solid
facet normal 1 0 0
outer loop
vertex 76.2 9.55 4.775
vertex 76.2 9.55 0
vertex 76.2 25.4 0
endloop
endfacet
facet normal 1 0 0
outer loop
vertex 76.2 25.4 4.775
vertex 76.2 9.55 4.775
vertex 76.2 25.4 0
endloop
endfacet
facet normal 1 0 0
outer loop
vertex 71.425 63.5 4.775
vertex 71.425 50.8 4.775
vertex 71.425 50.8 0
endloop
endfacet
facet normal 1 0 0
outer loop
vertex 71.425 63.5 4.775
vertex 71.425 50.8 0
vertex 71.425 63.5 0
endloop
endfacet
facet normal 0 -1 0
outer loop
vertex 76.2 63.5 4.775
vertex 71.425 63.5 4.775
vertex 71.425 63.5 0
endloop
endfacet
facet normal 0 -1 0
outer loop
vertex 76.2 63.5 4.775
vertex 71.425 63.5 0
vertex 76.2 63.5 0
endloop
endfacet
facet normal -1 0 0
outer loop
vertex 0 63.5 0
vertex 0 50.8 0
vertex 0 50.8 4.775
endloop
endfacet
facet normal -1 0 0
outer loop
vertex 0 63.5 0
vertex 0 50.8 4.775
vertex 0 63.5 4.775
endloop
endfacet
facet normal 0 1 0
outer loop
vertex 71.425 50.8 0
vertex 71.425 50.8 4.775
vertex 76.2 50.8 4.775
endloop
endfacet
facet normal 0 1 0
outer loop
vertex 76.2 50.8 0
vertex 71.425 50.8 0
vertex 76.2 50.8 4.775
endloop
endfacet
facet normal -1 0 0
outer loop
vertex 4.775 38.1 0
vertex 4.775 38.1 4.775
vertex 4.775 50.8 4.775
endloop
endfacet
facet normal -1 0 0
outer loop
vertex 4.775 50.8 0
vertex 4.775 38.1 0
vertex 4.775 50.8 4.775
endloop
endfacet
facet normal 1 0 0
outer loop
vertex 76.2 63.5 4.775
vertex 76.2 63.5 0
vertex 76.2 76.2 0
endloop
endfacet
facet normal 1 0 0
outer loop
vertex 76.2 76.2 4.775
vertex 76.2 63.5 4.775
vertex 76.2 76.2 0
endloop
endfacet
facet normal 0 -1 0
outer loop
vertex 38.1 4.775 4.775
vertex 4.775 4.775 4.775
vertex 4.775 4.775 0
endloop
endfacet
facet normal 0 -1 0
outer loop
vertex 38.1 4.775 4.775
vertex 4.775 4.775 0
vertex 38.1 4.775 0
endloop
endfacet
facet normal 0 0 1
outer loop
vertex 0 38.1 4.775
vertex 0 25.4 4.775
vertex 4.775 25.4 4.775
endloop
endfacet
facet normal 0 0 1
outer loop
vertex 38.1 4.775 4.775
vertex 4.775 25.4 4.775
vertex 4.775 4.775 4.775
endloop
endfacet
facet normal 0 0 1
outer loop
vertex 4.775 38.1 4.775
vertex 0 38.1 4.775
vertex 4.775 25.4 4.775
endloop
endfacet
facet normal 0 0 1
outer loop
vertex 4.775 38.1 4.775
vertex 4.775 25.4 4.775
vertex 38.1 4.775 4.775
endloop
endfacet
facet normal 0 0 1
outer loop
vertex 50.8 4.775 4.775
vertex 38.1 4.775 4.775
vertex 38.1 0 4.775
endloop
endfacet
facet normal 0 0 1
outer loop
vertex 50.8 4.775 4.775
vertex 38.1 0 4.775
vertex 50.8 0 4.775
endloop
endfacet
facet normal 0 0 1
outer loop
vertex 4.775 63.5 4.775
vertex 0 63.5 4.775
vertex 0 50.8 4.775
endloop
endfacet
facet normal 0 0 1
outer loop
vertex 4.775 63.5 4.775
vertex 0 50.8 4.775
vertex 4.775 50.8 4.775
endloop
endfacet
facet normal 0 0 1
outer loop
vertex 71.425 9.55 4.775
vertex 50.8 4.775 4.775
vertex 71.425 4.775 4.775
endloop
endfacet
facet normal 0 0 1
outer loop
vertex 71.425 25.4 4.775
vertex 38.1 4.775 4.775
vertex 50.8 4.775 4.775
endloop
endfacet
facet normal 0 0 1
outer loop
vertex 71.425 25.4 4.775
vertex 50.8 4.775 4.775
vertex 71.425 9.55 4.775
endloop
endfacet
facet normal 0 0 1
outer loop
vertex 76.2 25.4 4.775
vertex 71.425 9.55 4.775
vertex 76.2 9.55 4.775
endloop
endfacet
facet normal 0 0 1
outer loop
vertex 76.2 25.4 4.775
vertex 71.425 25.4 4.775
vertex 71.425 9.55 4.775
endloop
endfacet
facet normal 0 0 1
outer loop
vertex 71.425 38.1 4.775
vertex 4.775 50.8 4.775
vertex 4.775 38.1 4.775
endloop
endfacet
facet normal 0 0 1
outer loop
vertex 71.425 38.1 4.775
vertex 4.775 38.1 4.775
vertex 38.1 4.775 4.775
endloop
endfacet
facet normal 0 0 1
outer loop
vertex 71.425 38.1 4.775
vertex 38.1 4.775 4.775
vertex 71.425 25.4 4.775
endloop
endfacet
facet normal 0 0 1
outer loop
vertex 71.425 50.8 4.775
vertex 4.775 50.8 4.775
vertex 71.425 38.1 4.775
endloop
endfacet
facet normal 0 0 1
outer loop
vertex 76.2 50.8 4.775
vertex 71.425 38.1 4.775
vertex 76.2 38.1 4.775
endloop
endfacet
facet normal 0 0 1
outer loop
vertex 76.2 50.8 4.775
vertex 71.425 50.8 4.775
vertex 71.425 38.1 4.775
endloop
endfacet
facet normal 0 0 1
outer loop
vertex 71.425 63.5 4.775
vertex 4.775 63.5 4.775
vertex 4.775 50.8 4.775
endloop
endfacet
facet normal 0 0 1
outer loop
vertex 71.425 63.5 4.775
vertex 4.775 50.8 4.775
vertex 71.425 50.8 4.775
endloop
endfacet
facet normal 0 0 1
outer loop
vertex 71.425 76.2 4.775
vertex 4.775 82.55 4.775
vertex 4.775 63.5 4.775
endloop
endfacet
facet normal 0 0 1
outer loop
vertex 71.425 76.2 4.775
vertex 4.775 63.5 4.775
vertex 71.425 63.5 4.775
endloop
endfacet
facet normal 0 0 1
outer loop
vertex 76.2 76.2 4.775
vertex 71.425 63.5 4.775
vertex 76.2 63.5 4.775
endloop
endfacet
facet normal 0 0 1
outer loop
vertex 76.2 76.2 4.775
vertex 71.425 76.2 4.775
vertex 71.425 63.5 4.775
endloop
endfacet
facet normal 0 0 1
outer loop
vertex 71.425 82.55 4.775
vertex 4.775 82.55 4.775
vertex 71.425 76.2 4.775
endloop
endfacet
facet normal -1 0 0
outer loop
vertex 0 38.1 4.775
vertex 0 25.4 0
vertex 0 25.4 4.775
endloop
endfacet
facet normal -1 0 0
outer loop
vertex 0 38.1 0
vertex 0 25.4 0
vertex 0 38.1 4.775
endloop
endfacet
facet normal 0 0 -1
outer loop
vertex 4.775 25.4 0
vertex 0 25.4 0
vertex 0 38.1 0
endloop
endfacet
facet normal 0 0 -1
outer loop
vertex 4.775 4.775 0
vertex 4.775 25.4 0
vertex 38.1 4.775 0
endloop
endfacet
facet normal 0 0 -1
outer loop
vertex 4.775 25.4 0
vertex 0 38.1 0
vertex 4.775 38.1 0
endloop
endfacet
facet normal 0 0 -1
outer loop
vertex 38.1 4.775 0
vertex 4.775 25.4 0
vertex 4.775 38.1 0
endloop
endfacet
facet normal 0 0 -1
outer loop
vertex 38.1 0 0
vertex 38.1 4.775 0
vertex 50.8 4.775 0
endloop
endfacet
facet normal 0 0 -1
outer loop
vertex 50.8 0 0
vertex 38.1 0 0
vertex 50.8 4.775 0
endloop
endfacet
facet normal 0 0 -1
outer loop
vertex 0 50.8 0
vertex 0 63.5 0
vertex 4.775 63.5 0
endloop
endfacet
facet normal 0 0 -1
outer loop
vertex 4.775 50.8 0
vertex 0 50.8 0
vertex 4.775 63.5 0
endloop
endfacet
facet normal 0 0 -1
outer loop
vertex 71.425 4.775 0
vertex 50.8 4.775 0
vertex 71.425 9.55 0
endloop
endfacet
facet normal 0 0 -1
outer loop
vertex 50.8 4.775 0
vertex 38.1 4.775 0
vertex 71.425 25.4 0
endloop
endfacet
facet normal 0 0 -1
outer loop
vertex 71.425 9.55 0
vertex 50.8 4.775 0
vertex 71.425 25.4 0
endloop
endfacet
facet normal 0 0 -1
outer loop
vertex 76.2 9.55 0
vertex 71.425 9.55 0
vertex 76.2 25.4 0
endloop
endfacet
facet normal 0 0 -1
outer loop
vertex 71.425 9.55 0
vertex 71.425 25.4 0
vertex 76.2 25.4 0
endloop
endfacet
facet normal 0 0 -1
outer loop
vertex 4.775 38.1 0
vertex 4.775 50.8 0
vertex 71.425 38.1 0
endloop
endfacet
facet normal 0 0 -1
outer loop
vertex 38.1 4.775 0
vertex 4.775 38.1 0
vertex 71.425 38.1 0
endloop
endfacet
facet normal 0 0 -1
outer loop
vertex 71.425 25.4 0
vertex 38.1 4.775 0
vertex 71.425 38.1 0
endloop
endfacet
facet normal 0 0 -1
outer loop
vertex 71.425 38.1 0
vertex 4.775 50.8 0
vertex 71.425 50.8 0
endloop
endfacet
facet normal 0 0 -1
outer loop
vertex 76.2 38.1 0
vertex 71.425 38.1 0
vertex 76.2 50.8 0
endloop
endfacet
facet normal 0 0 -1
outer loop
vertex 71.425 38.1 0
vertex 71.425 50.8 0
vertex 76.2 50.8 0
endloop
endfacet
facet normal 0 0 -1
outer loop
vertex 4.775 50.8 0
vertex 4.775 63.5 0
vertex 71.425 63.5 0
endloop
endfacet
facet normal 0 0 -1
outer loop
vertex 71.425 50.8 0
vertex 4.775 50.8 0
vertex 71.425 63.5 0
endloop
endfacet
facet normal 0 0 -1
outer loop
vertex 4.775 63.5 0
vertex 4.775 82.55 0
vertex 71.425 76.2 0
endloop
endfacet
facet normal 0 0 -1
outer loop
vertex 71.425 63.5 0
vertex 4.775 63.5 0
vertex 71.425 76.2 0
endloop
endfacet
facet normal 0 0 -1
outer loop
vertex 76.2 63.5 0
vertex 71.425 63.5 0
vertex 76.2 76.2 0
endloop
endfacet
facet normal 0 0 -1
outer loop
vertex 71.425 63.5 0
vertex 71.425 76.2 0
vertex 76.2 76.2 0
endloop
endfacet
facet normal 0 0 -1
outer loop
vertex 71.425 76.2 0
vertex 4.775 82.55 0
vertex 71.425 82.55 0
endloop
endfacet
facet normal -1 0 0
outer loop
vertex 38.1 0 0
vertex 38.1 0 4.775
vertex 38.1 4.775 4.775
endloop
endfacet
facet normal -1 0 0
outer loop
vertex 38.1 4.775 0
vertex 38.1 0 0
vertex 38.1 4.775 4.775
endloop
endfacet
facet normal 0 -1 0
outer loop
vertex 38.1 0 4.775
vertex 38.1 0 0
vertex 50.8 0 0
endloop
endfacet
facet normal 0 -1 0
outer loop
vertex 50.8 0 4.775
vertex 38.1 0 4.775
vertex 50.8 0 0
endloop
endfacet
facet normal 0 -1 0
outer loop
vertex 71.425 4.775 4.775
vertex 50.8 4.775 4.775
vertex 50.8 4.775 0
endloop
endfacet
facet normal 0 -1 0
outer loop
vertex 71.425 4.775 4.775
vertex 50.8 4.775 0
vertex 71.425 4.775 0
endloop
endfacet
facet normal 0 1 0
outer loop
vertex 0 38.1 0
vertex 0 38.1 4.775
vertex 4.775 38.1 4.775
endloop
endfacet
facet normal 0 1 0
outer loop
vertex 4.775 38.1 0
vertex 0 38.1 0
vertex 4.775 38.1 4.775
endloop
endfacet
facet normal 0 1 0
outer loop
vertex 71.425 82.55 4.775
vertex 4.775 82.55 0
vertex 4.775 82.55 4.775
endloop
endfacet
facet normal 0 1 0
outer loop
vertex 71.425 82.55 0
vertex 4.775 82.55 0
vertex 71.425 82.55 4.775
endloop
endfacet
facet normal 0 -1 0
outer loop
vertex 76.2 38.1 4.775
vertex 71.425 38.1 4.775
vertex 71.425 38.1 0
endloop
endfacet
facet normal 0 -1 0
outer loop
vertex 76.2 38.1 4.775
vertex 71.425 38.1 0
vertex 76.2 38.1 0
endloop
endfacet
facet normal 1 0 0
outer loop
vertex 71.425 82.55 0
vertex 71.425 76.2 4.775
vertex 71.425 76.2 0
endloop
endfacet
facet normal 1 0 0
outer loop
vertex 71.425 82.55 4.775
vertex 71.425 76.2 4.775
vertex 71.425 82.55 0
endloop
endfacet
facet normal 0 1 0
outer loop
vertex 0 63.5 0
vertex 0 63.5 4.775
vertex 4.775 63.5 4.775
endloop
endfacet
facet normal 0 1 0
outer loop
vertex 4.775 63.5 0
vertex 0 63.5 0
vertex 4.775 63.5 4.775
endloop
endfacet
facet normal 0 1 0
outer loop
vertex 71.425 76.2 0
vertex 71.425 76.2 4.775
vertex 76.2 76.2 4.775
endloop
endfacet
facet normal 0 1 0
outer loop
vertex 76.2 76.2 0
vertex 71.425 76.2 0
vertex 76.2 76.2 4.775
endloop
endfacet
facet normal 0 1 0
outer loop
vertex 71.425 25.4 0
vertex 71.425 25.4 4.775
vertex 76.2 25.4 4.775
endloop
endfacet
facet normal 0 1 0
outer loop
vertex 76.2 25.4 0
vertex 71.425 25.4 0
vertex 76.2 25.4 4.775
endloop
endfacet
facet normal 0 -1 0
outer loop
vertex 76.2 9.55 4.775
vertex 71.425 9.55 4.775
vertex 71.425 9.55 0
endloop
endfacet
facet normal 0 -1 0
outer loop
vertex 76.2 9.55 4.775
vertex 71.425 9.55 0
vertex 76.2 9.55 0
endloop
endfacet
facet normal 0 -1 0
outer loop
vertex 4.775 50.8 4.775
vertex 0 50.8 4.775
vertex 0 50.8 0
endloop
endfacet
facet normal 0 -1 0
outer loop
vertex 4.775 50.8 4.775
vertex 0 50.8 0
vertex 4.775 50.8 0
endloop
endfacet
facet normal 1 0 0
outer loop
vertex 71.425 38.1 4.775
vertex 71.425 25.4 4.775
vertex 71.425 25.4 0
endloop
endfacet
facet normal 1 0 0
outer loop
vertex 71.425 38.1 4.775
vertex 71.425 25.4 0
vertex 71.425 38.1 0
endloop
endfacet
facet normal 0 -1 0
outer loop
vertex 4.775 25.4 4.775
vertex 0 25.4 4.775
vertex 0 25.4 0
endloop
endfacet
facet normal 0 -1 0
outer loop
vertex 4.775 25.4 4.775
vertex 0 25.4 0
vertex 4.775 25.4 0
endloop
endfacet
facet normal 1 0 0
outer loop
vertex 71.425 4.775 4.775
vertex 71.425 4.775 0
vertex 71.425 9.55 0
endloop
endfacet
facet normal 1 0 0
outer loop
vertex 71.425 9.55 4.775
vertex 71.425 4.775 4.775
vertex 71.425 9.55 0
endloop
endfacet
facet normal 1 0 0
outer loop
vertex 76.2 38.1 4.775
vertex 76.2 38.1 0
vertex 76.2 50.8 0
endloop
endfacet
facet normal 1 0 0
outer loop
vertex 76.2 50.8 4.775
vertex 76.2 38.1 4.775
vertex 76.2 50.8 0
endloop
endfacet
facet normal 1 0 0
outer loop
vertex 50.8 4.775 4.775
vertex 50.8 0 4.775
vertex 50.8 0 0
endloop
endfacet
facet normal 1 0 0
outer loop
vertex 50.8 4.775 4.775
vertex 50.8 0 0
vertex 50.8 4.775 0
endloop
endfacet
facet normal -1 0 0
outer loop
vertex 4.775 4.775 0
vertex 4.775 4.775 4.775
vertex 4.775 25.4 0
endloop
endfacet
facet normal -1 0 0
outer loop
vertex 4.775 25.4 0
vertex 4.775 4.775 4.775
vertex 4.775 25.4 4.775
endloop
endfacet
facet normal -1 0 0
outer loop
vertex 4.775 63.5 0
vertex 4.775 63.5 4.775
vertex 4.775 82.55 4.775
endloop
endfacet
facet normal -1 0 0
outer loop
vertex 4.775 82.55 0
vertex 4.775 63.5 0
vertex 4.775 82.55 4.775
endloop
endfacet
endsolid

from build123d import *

# Parameters (mm, degrees)
SKETCH2_W           = 76.2
SKETCH2_H           = 82.55
BOSS_EXTRUDE1_DEPTH = 4.7752
SKETCH3_W           = 38.1
SKETCH3_H           = 4.7752
SKETCH3_W_2         = 25.4
CUT_EXTRUDE1_DEPTH  = 4.7752
SKETCH4_W           = 4.7752
SKETCH4_H           = 19.05
SKETCH4_H_2         = 12.7
SKETCH4_H_3         = 20.6248
CUT_EXTRUDE2_DEPTH  = 4.7752
SKETCH5_W           = 4.7752
SKETCH5_H           = 4.7752
SKETCH5_H_2         = 12.7
SKETCH5_H_3         = 6.35
CUT_EXTRUDE3_DEPTH  = 4.7752


with BuildPart() as part:
    # Sketch2 → Boss-Extrude1 (new body)
    with BuildSketch(Plane.XY):
        with Locations((38.1, 41.275)):
            Rectangle(SKETCH2_W, SKETCH2_H)
    extrude(amount=BOSS_EXTRUDE1_DEPTH)

    # Sketch3 → Cut-Extrude1 (cut)
    with BuildSketch(Plane.XY.offset(4.7752)):
        with Locations((19.05, 2.3876)):
            Rectangle(SKETCH3_W, SKETCH3_H)
        with Locations((63.5, 2.3876)):
            Rectangle(SKETCH3_W_2, SKETCH3_H)
    extrude(amount=-CUT_EXTRUDE1_DEPTH, mode=Mode.SUBTRACT)

    # Sketch4 → Cut-Extrude2 (cut)
    with BuildSketch(Plane.XY.offset(4.7752)):
        with Locations((2.3876, 73.025)):
            Rectangle(SKETCH4_W, SKETCH4_H)
        with Locations((2.3876, 44.45)):
            Rectangle(SKETCH4_W, SKETCH4_H_2)
        with Locations((2.3876, 15.0876)):
            Rectangle(SKETCH4_W, SKETCH4_H_3)
    extrude(amount=-CUT_EXTRUDE2_DEPTH, mode=Mode.SUBTRACT)

    # Sketch5 → Cut-Extrude3 (cut)
    with BuildSketch(Plane.XY.offset(4.7752)):
        with Locations((73.8124, 7.1628)):
            Rectangle(SKETCH5_W, SKETCH5_H)
        with Locations((73.8124, 31.75)):
            Rectangle(SKETCH5_W, SKETCH5_H_2)
        with Locations((73.8124, 57.15)):
            Rectangle(SKETCH5_W, SKETCH5_H_2)
        with Locations((73.8124, 79.375)):
            Rectangle(SKETCH5_W, SKETCH5_H_3)
    extrude(amount=-CUT_EXTRUDE3_DEPTH, mode=Mode.SUBTRACT)


solid = part.part
